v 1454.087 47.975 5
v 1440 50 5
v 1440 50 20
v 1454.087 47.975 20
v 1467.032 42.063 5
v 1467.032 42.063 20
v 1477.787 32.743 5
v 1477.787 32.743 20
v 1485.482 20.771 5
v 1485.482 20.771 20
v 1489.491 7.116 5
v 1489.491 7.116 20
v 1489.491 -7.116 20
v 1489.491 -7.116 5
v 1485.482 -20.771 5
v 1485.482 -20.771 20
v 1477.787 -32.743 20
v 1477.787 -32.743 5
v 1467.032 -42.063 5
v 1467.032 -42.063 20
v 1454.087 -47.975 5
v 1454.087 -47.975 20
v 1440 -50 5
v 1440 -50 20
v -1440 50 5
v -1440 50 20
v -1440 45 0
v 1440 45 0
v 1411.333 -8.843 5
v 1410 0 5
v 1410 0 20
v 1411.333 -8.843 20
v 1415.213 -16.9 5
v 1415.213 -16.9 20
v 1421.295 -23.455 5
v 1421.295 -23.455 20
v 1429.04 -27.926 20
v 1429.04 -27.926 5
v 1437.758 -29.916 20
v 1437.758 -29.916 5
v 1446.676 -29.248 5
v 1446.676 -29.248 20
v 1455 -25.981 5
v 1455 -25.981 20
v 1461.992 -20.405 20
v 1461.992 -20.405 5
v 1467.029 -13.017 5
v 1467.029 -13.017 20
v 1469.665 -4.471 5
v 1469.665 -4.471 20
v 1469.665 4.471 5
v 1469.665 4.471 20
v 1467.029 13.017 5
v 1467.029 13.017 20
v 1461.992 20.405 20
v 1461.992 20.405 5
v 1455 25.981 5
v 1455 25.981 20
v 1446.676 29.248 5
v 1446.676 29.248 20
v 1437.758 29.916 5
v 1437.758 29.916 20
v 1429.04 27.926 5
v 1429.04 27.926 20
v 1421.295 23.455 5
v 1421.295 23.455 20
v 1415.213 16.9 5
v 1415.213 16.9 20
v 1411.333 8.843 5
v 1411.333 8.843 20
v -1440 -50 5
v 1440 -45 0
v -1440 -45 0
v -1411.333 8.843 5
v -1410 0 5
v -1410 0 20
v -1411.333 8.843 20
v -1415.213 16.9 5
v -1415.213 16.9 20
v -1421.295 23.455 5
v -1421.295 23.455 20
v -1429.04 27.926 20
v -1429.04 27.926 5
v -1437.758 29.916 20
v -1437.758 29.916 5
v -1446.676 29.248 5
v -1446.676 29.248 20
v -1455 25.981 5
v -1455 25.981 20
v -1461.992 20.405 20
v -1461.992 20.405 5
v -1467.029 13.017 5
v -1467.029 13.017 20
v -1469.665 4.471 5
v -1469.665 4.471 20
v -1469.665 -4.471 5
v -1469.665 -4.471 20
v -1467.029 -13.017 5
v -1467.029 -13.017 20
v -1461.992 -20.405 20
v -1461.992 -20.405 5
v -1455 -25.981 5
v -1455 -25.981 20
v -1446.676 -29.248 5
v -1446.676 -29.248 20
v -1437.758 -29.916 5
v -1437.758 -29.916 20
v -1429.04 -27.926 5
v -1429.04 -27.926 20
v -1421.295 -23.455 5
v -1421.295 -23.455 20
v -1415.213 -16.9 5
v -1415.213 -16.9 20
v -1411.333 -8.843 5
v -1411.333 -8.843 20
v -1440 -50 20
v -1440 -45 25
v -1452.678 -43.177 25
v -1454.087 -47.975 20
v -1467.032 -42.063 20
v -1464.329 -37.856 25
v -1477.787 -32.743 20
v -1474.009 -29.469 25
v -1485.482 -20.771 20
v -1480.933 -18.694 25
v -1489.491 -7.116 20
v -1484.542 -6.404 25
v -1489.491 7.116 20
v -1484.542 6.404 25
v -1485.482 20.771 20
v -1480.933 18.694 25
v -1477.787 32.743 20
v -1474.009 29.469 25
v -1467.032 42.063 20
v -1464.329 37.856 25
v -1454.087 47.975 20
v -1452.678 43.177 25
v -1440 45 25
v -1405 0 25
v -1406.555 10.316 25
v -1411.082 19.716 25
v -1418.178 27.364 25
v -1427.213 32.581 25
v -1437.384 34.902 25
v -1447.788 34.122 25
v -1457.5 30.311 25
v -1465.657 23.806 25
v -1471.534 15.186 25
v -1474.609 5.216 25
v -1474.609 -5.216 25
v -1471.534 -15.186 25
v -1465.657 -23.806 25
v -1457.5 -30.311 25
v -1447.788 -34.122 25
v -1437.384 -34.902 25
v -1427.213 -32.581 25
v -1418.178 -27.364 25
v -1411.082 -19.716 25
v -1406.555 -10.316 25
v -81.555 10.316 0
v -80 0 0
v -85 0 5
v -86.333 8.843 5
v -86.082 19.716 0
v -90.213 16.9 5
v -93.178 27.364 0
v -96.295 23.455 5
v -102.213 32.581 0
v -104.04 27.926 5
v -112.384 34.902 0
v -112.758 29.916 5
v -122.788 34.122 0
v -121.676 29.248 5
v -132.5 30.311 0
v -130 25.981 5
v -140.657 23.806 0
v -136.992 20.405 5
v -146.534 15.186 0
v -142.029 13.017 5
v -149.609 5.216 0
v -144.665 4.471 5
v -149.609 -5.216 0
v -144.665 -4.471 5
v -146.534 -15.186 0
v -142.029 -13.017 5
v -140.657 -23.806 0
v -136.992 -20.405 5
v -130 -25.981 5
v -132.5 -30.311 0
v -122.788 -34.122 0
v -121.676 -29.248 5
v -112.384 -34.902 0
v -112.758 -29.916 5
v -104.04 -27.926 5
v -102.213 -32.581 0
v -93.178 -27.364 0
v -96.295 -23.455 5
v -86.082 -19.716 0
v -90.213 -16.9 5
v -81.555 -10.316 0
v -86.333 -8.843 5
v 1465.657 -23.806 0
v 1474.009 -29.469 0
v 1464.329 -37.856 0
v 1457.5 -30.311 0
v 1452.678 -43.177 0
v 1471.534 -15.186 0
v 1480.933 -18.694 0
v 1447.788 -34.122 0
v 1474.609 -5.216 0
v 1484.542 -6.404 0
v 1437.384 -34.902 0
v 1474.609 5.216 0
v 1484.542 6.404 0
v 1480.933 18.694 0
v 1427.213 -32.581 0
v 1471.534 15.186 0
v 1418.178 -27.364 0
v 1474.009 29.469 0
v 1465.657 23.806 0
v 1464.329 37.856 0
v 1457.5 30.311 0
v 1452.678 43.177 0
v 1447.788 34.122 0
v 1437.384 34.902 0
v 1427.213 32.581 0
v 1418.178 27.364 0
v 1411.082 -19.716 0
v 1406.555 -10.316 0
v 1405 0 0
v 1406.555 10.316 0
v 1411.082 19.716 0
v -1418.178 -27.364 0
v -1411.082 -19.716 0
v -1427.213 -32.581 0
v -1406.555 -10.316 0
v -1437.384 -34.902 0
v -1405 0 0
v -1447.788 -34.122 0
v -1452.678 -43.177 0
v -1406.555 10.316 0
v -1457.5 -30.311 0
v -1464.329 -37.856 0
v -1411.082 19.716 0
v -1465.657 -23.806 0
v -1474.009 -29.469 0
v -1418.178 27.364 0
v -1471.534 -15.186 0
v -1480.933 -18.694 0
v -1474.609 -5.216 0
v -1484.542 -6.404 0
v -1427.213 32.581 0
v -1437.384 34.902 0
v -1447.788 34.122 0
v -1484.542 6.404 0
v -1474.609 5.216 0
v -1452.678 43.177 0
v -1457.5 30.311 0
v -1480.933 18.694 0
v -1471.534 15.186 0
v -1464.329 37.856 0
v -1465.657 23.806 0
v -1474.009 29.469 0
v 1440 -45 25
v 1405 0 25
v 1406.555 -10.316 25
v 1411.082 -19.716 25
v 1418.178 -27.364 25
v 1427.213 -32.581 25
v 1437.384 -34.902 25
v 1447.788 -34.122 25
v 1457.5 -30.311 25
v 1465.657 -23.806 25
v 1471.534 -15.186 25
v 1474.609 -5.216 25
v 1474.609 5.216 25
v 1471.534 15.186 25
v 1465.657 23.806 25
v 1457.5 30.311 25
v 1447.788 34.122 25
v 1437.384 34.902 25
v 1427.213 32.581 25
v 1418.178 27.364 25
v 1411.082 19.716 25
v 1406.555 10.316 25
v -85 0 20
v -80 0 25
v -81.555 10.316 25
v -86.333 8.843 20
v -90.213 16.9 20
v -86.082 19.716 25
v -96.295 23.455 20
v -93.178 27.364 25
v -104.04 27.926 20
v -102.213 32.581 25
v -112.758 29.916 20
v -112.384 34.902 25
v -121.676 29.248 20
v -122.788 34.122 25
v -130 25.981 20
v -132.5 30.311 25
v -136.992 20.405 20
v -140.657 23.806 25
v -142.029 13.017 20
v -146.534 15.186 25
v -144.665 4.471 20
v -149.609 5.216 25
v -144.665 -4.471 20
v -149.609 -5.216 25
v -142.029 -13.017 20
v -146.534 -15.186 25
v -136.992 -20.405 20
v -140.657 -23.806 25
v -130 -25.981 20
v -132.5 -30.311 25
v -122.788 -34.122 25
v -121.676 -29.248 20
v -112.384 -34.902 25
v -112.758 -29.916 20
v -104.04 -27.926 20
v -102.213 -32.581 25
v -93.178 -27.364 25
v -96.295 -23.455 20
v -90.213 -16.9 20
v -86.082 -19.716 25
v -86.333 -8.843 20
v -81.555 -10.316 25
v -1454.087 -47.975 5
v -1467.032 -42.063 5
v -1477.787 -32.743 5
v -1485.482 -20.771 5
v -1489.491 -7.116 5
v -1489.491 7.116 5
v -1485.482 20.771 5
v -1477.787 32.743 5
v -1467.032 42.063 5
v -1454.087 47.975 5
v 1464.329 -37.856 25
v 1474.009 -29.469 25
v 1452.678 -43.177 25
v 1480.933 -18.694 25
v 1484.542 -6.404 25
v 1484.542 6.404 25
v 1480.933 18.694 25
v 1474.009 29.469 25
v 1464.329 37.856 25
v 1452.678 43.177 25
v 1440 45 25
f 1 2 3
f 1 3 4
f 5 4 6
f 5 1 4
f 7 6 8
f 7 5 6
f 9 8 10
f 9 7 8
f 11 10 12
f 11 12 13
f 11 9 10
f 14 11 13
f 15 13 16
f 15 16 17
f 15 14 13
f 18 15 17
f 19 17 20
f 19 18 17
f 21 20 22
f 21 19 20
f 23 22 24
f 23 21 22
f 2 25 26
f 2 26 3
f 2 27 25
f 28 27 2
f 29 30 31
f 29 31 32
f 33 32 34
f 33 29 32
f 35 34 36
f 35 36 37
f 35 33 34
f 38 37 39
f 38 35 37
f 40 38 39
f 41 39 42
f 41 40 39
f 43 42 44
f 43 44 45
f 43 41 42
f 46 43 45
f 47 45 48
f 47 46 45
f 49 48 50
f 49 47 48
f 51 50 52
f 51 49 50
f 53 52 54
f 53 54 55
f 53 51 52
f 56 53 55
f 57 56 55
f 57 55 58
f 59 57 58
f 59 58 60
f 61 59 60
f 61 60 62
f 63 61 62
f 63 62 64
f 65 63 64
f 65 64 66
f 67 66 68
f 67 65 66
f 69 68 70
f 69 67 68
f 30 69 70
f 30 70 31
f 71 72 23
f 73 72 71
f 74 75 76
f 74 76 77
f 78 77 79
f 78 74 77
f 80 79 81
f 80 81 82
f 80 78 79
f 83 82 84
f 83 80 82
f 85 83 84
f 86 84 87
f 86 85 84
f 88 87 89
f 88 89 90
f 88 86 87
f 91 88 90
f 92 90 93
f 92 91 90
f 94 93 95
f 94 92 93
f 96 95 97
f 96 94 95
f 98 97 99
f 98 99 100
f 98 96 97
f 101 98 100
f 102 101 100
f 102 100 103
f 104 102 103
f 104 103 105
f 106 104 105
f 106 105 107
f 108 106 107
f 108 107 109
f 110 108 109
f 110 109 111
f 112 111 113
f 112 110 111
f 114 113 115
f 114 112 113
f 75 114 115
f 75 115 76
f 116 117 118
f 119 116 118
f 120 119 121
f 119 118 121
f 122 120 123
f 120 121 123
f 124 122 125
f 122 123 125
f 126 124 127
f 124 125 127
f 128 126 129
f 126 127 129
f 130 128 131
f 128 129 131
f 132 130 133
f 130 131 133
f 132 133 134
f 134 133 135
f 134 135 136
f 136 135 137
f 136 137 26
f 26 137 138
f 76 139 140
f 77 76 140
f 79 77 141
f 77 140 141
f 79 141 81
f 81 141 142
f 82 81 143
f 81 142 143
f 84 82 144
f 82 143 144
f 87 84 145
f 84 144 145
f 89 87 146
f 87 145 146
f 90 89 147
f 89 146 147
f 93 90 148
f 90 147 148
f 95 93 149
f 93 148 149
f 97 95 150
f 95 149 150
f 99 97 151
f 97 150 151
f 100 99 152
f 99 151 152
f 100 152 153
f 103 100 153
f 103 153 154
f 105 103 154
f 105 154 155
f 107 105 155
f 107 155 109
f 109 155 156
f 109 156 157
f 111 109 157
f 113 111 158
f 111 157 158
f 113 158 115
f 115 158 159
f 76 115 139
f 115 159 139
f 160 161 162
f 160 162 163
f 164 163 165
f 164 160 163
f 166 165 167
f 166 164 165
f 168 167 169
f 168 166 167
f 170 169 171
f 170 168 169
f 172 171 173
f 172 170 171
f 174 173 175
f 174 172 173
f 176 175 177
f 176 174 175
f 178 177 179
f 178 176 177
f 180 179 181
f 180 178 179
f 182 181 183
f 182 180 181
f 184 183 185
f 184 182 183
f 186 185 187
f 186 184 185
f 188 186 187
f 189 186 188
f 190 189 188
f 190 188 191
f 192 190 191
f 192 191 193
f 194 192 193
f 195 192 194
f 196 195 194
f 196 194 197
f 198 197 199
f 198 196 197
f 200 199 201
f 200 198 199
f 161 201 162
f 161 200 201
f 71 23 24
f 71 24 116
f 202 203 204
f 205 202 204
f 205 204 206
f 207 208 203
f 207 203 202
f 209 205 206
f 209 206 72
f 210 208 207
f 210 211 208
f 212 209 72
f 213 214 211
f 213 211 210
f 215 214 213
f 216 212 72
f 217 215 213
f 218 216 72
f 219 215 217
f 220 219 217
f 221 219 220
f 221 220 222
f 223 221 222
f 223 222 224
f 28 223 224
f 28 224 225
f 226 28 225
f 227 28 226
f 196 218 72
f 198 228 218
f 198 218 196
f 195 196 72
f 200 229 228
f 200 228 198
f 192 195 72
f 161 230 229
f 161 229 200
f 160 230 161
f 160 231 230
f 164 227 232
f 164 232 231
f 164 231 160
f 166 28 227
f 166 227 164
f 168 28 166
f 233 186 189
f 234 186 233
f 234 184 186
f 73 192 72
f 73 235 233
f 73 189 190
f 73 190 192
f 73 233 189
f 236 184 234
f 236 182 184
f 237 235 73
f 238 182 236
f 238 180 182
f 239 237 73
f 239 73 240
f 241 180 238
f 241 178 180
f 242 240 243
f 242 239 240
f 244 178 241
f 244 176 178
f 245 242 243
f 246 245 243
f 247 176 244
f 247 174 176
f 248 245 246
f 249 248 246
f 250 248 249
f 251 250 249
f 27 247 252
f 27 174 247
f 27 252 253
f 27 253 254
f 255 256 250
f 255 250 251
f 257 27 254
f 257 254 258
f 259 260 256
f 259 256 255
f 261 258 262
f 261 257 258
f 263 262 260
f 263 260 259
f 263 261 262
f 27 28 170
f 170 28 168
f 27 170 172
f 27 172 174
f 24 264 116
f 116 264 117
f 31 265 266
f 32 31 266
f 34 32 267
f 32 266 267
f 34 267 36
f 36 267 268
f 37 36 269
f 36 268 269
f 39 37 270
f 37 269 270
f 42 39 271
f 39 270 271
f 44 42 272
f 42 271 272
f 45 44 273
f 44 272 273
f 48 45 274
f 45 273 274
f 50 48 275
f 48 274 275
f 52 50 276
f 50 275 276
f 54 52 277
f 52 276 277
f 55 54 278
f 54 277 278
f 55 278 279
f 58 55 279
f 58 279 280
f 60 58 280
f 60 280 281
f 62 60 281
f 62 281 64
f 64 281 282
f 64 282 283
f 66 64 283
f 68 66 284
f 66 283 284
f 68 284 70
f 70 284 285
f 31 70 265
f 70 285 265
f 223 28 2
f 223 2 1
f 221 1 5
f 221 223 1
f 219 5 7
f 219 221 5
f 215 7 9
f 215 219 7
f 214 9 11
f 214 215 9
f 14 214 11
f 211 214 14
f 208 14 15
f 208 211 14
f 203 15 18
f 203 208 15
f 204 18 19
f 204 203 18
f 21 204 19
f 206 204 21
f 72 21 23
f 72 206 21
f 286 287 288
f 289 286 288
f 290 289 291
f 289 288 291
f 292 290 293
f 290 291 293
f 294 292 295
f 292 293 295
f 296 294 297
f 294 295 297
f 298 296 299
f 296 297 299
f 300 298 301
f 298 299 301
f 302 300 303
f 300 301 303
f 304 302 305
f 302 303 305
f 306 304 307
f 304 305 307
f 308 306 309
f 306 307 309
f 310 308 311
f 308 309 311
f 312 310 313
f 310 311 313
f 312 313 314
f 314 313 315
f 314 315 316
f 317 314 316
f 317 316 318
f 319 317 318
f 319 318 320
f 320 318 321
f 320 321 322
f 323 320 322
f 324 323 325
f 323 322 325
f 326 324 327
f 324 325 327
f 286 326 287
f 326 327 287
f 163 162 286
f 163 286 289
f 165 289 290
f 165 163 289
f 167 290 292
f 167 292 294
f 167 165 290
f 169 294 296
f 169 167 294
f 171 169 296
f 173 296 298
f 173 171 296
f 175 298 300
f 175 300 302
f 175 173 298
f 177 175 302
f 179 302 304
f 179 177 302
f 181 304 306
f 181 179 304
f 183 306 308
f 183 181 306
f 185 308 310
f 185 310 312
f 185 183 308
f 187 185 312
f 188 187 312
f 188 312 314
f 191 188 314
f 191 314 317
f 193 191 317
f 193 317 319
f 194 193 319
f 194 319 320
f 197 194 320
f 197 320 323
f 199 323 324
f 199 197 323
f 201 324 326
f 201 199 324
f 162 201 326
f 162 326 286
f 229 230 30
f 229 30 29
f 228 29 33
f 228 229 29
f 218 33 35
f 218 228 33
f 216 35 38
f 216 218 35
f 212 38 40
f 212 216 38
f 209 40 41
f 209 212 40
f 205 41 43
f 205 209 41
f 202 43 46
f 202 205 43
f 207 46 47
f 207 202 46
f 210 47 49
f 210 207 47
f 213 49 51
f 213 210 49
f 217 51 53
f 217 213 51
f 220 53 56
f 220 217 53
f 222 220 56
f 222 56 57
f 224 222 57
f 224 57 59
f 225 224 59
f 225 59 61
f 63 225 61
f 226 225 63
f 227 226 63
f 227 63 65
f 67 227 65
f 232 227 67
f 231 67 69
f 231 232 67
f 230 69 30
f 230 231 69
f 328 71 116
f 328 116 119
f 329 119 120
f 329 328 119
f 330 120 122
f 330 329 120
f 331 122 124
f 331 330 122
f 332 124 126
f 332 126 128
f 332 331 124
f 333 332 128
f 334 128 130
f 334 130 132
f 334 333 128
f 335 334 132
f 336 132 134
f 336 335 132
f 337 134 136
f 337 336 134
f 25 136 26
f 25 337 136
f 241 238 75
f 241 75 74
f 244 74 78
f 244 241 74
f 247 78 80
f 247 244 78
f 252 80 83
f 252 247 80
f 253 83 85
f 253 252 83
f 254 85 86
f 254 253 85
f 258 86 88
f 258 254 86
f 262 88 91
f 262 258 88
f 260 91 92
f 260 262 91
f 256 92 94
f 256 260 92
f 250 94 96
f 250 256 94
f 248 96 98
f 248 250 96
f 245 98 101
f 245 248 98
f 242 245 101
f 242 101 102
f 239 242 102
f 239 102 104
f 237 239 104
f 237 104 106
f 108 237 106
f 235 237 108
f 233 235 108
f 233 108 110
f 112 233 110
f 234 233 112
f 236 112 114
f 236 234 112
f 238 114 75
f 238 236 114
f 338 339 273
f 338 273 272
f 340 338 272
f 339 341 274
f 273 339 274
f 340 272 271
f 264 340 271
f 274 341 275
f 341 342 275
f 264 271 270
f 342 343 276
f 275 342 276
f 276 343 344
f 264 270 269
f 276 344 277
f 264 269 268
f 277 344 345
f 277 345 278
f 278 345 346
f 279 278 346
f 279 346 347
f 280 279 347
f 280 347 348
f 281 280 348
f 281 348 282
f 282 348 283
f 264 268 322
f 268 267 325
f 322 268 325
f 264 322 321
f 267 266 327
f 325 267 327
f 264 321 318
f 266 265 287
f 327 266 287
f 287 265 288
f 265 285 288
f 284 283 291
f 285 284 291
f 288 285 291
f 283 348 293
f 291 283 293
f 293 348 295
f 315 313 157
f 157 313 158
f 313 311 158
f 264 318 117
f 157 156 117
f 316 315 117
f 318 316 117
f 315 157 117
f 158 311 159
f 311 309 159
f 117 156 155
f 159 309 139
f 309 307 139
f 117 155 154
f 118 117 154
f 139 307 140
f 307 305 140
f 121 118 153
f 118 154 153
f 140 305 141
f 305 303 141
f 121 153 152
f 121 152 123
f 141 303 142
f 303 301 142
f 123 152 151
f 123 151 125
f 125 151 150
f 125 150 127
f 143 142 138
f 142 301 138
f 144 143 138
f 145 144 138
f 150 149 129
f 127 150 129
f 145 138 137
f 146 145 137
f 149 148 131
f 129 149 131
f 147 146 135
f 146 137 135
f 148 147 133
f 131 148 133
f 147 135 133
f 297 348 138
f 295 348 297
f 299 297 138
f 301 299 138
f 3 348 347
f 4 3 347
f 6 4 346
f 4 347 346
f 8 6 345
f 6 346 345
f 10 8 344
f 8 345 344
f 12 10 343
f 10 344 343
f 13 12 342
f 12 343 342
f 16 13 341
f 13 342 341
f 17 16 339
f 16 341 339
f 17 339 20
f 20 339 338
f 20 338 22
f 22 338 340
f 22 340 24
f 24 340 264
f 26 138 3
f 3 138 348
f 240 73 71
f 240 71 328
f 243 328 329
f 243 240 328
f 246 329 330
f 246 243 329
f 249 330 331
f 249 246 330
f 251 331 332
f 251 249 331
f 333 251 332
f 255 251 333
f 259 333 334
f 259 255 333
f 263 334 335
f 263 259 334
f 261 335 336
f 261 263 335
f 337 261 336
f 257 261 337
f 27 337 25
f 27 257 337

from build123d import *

# Parameters (mm, degrees)
SKETCH1_R           = 30
BOSS_EXTRUDE1_DEPTH = 25
CHAMFER1_SIZE       = 5


with BuildPart() as part:
    # Sketch1 → Boss-Extrude1 (new body)
    with BuildSketch(Plane.XY):
        with BuildLine():
            Line((1440, -50), (-1440, -50))
            ThreePointArc((-1440, -50), (-1490, 0), (-1440, 50))
            Line((-1440, 50), (1440, 50))
            ThreePointArc((1440, 50), (1490, 0), (1440, -50))
        make_face()
        with Locations((-1440, 0)):
            Circle(SKETCH1_R, mode=Mode.SUBTRACT)
        with Locations(Location((1440, 0, 0), (0, 0, 180))):
            Circle(SKETCH1_R, mode=Mode.SUBTRACT)
        with Locations((-115, 0)):
            Circle(SKETCH1_R, mode=Mode.SUBTRACT)
    extrude(amount=BOSS_EXTRUDE1_DEPTH)

    # Chamfer1
    chamfer1_edges = [part.edges().sort_by_distance(p)[0] for p in [
        (1490, 0, 25),
        (-1470, 0, 0),
        (-1470, 0, 25),
        (0, 50, 25),
        (1470, 0, 0),
        (1470, 0, 25),
        (-145, 0, 0),
        (-145, 0, 25),
        (-1490, 0, 25),
        (0, 50, 0),
        (1490, 0, 0),
        (0, -50, 0),
        (-1490, 0, 0),
        (0, -50, 25),
    ]]
    chamfer(chamfer1_edges, length=CHAMFER1_SIZE)


solid = part.part
